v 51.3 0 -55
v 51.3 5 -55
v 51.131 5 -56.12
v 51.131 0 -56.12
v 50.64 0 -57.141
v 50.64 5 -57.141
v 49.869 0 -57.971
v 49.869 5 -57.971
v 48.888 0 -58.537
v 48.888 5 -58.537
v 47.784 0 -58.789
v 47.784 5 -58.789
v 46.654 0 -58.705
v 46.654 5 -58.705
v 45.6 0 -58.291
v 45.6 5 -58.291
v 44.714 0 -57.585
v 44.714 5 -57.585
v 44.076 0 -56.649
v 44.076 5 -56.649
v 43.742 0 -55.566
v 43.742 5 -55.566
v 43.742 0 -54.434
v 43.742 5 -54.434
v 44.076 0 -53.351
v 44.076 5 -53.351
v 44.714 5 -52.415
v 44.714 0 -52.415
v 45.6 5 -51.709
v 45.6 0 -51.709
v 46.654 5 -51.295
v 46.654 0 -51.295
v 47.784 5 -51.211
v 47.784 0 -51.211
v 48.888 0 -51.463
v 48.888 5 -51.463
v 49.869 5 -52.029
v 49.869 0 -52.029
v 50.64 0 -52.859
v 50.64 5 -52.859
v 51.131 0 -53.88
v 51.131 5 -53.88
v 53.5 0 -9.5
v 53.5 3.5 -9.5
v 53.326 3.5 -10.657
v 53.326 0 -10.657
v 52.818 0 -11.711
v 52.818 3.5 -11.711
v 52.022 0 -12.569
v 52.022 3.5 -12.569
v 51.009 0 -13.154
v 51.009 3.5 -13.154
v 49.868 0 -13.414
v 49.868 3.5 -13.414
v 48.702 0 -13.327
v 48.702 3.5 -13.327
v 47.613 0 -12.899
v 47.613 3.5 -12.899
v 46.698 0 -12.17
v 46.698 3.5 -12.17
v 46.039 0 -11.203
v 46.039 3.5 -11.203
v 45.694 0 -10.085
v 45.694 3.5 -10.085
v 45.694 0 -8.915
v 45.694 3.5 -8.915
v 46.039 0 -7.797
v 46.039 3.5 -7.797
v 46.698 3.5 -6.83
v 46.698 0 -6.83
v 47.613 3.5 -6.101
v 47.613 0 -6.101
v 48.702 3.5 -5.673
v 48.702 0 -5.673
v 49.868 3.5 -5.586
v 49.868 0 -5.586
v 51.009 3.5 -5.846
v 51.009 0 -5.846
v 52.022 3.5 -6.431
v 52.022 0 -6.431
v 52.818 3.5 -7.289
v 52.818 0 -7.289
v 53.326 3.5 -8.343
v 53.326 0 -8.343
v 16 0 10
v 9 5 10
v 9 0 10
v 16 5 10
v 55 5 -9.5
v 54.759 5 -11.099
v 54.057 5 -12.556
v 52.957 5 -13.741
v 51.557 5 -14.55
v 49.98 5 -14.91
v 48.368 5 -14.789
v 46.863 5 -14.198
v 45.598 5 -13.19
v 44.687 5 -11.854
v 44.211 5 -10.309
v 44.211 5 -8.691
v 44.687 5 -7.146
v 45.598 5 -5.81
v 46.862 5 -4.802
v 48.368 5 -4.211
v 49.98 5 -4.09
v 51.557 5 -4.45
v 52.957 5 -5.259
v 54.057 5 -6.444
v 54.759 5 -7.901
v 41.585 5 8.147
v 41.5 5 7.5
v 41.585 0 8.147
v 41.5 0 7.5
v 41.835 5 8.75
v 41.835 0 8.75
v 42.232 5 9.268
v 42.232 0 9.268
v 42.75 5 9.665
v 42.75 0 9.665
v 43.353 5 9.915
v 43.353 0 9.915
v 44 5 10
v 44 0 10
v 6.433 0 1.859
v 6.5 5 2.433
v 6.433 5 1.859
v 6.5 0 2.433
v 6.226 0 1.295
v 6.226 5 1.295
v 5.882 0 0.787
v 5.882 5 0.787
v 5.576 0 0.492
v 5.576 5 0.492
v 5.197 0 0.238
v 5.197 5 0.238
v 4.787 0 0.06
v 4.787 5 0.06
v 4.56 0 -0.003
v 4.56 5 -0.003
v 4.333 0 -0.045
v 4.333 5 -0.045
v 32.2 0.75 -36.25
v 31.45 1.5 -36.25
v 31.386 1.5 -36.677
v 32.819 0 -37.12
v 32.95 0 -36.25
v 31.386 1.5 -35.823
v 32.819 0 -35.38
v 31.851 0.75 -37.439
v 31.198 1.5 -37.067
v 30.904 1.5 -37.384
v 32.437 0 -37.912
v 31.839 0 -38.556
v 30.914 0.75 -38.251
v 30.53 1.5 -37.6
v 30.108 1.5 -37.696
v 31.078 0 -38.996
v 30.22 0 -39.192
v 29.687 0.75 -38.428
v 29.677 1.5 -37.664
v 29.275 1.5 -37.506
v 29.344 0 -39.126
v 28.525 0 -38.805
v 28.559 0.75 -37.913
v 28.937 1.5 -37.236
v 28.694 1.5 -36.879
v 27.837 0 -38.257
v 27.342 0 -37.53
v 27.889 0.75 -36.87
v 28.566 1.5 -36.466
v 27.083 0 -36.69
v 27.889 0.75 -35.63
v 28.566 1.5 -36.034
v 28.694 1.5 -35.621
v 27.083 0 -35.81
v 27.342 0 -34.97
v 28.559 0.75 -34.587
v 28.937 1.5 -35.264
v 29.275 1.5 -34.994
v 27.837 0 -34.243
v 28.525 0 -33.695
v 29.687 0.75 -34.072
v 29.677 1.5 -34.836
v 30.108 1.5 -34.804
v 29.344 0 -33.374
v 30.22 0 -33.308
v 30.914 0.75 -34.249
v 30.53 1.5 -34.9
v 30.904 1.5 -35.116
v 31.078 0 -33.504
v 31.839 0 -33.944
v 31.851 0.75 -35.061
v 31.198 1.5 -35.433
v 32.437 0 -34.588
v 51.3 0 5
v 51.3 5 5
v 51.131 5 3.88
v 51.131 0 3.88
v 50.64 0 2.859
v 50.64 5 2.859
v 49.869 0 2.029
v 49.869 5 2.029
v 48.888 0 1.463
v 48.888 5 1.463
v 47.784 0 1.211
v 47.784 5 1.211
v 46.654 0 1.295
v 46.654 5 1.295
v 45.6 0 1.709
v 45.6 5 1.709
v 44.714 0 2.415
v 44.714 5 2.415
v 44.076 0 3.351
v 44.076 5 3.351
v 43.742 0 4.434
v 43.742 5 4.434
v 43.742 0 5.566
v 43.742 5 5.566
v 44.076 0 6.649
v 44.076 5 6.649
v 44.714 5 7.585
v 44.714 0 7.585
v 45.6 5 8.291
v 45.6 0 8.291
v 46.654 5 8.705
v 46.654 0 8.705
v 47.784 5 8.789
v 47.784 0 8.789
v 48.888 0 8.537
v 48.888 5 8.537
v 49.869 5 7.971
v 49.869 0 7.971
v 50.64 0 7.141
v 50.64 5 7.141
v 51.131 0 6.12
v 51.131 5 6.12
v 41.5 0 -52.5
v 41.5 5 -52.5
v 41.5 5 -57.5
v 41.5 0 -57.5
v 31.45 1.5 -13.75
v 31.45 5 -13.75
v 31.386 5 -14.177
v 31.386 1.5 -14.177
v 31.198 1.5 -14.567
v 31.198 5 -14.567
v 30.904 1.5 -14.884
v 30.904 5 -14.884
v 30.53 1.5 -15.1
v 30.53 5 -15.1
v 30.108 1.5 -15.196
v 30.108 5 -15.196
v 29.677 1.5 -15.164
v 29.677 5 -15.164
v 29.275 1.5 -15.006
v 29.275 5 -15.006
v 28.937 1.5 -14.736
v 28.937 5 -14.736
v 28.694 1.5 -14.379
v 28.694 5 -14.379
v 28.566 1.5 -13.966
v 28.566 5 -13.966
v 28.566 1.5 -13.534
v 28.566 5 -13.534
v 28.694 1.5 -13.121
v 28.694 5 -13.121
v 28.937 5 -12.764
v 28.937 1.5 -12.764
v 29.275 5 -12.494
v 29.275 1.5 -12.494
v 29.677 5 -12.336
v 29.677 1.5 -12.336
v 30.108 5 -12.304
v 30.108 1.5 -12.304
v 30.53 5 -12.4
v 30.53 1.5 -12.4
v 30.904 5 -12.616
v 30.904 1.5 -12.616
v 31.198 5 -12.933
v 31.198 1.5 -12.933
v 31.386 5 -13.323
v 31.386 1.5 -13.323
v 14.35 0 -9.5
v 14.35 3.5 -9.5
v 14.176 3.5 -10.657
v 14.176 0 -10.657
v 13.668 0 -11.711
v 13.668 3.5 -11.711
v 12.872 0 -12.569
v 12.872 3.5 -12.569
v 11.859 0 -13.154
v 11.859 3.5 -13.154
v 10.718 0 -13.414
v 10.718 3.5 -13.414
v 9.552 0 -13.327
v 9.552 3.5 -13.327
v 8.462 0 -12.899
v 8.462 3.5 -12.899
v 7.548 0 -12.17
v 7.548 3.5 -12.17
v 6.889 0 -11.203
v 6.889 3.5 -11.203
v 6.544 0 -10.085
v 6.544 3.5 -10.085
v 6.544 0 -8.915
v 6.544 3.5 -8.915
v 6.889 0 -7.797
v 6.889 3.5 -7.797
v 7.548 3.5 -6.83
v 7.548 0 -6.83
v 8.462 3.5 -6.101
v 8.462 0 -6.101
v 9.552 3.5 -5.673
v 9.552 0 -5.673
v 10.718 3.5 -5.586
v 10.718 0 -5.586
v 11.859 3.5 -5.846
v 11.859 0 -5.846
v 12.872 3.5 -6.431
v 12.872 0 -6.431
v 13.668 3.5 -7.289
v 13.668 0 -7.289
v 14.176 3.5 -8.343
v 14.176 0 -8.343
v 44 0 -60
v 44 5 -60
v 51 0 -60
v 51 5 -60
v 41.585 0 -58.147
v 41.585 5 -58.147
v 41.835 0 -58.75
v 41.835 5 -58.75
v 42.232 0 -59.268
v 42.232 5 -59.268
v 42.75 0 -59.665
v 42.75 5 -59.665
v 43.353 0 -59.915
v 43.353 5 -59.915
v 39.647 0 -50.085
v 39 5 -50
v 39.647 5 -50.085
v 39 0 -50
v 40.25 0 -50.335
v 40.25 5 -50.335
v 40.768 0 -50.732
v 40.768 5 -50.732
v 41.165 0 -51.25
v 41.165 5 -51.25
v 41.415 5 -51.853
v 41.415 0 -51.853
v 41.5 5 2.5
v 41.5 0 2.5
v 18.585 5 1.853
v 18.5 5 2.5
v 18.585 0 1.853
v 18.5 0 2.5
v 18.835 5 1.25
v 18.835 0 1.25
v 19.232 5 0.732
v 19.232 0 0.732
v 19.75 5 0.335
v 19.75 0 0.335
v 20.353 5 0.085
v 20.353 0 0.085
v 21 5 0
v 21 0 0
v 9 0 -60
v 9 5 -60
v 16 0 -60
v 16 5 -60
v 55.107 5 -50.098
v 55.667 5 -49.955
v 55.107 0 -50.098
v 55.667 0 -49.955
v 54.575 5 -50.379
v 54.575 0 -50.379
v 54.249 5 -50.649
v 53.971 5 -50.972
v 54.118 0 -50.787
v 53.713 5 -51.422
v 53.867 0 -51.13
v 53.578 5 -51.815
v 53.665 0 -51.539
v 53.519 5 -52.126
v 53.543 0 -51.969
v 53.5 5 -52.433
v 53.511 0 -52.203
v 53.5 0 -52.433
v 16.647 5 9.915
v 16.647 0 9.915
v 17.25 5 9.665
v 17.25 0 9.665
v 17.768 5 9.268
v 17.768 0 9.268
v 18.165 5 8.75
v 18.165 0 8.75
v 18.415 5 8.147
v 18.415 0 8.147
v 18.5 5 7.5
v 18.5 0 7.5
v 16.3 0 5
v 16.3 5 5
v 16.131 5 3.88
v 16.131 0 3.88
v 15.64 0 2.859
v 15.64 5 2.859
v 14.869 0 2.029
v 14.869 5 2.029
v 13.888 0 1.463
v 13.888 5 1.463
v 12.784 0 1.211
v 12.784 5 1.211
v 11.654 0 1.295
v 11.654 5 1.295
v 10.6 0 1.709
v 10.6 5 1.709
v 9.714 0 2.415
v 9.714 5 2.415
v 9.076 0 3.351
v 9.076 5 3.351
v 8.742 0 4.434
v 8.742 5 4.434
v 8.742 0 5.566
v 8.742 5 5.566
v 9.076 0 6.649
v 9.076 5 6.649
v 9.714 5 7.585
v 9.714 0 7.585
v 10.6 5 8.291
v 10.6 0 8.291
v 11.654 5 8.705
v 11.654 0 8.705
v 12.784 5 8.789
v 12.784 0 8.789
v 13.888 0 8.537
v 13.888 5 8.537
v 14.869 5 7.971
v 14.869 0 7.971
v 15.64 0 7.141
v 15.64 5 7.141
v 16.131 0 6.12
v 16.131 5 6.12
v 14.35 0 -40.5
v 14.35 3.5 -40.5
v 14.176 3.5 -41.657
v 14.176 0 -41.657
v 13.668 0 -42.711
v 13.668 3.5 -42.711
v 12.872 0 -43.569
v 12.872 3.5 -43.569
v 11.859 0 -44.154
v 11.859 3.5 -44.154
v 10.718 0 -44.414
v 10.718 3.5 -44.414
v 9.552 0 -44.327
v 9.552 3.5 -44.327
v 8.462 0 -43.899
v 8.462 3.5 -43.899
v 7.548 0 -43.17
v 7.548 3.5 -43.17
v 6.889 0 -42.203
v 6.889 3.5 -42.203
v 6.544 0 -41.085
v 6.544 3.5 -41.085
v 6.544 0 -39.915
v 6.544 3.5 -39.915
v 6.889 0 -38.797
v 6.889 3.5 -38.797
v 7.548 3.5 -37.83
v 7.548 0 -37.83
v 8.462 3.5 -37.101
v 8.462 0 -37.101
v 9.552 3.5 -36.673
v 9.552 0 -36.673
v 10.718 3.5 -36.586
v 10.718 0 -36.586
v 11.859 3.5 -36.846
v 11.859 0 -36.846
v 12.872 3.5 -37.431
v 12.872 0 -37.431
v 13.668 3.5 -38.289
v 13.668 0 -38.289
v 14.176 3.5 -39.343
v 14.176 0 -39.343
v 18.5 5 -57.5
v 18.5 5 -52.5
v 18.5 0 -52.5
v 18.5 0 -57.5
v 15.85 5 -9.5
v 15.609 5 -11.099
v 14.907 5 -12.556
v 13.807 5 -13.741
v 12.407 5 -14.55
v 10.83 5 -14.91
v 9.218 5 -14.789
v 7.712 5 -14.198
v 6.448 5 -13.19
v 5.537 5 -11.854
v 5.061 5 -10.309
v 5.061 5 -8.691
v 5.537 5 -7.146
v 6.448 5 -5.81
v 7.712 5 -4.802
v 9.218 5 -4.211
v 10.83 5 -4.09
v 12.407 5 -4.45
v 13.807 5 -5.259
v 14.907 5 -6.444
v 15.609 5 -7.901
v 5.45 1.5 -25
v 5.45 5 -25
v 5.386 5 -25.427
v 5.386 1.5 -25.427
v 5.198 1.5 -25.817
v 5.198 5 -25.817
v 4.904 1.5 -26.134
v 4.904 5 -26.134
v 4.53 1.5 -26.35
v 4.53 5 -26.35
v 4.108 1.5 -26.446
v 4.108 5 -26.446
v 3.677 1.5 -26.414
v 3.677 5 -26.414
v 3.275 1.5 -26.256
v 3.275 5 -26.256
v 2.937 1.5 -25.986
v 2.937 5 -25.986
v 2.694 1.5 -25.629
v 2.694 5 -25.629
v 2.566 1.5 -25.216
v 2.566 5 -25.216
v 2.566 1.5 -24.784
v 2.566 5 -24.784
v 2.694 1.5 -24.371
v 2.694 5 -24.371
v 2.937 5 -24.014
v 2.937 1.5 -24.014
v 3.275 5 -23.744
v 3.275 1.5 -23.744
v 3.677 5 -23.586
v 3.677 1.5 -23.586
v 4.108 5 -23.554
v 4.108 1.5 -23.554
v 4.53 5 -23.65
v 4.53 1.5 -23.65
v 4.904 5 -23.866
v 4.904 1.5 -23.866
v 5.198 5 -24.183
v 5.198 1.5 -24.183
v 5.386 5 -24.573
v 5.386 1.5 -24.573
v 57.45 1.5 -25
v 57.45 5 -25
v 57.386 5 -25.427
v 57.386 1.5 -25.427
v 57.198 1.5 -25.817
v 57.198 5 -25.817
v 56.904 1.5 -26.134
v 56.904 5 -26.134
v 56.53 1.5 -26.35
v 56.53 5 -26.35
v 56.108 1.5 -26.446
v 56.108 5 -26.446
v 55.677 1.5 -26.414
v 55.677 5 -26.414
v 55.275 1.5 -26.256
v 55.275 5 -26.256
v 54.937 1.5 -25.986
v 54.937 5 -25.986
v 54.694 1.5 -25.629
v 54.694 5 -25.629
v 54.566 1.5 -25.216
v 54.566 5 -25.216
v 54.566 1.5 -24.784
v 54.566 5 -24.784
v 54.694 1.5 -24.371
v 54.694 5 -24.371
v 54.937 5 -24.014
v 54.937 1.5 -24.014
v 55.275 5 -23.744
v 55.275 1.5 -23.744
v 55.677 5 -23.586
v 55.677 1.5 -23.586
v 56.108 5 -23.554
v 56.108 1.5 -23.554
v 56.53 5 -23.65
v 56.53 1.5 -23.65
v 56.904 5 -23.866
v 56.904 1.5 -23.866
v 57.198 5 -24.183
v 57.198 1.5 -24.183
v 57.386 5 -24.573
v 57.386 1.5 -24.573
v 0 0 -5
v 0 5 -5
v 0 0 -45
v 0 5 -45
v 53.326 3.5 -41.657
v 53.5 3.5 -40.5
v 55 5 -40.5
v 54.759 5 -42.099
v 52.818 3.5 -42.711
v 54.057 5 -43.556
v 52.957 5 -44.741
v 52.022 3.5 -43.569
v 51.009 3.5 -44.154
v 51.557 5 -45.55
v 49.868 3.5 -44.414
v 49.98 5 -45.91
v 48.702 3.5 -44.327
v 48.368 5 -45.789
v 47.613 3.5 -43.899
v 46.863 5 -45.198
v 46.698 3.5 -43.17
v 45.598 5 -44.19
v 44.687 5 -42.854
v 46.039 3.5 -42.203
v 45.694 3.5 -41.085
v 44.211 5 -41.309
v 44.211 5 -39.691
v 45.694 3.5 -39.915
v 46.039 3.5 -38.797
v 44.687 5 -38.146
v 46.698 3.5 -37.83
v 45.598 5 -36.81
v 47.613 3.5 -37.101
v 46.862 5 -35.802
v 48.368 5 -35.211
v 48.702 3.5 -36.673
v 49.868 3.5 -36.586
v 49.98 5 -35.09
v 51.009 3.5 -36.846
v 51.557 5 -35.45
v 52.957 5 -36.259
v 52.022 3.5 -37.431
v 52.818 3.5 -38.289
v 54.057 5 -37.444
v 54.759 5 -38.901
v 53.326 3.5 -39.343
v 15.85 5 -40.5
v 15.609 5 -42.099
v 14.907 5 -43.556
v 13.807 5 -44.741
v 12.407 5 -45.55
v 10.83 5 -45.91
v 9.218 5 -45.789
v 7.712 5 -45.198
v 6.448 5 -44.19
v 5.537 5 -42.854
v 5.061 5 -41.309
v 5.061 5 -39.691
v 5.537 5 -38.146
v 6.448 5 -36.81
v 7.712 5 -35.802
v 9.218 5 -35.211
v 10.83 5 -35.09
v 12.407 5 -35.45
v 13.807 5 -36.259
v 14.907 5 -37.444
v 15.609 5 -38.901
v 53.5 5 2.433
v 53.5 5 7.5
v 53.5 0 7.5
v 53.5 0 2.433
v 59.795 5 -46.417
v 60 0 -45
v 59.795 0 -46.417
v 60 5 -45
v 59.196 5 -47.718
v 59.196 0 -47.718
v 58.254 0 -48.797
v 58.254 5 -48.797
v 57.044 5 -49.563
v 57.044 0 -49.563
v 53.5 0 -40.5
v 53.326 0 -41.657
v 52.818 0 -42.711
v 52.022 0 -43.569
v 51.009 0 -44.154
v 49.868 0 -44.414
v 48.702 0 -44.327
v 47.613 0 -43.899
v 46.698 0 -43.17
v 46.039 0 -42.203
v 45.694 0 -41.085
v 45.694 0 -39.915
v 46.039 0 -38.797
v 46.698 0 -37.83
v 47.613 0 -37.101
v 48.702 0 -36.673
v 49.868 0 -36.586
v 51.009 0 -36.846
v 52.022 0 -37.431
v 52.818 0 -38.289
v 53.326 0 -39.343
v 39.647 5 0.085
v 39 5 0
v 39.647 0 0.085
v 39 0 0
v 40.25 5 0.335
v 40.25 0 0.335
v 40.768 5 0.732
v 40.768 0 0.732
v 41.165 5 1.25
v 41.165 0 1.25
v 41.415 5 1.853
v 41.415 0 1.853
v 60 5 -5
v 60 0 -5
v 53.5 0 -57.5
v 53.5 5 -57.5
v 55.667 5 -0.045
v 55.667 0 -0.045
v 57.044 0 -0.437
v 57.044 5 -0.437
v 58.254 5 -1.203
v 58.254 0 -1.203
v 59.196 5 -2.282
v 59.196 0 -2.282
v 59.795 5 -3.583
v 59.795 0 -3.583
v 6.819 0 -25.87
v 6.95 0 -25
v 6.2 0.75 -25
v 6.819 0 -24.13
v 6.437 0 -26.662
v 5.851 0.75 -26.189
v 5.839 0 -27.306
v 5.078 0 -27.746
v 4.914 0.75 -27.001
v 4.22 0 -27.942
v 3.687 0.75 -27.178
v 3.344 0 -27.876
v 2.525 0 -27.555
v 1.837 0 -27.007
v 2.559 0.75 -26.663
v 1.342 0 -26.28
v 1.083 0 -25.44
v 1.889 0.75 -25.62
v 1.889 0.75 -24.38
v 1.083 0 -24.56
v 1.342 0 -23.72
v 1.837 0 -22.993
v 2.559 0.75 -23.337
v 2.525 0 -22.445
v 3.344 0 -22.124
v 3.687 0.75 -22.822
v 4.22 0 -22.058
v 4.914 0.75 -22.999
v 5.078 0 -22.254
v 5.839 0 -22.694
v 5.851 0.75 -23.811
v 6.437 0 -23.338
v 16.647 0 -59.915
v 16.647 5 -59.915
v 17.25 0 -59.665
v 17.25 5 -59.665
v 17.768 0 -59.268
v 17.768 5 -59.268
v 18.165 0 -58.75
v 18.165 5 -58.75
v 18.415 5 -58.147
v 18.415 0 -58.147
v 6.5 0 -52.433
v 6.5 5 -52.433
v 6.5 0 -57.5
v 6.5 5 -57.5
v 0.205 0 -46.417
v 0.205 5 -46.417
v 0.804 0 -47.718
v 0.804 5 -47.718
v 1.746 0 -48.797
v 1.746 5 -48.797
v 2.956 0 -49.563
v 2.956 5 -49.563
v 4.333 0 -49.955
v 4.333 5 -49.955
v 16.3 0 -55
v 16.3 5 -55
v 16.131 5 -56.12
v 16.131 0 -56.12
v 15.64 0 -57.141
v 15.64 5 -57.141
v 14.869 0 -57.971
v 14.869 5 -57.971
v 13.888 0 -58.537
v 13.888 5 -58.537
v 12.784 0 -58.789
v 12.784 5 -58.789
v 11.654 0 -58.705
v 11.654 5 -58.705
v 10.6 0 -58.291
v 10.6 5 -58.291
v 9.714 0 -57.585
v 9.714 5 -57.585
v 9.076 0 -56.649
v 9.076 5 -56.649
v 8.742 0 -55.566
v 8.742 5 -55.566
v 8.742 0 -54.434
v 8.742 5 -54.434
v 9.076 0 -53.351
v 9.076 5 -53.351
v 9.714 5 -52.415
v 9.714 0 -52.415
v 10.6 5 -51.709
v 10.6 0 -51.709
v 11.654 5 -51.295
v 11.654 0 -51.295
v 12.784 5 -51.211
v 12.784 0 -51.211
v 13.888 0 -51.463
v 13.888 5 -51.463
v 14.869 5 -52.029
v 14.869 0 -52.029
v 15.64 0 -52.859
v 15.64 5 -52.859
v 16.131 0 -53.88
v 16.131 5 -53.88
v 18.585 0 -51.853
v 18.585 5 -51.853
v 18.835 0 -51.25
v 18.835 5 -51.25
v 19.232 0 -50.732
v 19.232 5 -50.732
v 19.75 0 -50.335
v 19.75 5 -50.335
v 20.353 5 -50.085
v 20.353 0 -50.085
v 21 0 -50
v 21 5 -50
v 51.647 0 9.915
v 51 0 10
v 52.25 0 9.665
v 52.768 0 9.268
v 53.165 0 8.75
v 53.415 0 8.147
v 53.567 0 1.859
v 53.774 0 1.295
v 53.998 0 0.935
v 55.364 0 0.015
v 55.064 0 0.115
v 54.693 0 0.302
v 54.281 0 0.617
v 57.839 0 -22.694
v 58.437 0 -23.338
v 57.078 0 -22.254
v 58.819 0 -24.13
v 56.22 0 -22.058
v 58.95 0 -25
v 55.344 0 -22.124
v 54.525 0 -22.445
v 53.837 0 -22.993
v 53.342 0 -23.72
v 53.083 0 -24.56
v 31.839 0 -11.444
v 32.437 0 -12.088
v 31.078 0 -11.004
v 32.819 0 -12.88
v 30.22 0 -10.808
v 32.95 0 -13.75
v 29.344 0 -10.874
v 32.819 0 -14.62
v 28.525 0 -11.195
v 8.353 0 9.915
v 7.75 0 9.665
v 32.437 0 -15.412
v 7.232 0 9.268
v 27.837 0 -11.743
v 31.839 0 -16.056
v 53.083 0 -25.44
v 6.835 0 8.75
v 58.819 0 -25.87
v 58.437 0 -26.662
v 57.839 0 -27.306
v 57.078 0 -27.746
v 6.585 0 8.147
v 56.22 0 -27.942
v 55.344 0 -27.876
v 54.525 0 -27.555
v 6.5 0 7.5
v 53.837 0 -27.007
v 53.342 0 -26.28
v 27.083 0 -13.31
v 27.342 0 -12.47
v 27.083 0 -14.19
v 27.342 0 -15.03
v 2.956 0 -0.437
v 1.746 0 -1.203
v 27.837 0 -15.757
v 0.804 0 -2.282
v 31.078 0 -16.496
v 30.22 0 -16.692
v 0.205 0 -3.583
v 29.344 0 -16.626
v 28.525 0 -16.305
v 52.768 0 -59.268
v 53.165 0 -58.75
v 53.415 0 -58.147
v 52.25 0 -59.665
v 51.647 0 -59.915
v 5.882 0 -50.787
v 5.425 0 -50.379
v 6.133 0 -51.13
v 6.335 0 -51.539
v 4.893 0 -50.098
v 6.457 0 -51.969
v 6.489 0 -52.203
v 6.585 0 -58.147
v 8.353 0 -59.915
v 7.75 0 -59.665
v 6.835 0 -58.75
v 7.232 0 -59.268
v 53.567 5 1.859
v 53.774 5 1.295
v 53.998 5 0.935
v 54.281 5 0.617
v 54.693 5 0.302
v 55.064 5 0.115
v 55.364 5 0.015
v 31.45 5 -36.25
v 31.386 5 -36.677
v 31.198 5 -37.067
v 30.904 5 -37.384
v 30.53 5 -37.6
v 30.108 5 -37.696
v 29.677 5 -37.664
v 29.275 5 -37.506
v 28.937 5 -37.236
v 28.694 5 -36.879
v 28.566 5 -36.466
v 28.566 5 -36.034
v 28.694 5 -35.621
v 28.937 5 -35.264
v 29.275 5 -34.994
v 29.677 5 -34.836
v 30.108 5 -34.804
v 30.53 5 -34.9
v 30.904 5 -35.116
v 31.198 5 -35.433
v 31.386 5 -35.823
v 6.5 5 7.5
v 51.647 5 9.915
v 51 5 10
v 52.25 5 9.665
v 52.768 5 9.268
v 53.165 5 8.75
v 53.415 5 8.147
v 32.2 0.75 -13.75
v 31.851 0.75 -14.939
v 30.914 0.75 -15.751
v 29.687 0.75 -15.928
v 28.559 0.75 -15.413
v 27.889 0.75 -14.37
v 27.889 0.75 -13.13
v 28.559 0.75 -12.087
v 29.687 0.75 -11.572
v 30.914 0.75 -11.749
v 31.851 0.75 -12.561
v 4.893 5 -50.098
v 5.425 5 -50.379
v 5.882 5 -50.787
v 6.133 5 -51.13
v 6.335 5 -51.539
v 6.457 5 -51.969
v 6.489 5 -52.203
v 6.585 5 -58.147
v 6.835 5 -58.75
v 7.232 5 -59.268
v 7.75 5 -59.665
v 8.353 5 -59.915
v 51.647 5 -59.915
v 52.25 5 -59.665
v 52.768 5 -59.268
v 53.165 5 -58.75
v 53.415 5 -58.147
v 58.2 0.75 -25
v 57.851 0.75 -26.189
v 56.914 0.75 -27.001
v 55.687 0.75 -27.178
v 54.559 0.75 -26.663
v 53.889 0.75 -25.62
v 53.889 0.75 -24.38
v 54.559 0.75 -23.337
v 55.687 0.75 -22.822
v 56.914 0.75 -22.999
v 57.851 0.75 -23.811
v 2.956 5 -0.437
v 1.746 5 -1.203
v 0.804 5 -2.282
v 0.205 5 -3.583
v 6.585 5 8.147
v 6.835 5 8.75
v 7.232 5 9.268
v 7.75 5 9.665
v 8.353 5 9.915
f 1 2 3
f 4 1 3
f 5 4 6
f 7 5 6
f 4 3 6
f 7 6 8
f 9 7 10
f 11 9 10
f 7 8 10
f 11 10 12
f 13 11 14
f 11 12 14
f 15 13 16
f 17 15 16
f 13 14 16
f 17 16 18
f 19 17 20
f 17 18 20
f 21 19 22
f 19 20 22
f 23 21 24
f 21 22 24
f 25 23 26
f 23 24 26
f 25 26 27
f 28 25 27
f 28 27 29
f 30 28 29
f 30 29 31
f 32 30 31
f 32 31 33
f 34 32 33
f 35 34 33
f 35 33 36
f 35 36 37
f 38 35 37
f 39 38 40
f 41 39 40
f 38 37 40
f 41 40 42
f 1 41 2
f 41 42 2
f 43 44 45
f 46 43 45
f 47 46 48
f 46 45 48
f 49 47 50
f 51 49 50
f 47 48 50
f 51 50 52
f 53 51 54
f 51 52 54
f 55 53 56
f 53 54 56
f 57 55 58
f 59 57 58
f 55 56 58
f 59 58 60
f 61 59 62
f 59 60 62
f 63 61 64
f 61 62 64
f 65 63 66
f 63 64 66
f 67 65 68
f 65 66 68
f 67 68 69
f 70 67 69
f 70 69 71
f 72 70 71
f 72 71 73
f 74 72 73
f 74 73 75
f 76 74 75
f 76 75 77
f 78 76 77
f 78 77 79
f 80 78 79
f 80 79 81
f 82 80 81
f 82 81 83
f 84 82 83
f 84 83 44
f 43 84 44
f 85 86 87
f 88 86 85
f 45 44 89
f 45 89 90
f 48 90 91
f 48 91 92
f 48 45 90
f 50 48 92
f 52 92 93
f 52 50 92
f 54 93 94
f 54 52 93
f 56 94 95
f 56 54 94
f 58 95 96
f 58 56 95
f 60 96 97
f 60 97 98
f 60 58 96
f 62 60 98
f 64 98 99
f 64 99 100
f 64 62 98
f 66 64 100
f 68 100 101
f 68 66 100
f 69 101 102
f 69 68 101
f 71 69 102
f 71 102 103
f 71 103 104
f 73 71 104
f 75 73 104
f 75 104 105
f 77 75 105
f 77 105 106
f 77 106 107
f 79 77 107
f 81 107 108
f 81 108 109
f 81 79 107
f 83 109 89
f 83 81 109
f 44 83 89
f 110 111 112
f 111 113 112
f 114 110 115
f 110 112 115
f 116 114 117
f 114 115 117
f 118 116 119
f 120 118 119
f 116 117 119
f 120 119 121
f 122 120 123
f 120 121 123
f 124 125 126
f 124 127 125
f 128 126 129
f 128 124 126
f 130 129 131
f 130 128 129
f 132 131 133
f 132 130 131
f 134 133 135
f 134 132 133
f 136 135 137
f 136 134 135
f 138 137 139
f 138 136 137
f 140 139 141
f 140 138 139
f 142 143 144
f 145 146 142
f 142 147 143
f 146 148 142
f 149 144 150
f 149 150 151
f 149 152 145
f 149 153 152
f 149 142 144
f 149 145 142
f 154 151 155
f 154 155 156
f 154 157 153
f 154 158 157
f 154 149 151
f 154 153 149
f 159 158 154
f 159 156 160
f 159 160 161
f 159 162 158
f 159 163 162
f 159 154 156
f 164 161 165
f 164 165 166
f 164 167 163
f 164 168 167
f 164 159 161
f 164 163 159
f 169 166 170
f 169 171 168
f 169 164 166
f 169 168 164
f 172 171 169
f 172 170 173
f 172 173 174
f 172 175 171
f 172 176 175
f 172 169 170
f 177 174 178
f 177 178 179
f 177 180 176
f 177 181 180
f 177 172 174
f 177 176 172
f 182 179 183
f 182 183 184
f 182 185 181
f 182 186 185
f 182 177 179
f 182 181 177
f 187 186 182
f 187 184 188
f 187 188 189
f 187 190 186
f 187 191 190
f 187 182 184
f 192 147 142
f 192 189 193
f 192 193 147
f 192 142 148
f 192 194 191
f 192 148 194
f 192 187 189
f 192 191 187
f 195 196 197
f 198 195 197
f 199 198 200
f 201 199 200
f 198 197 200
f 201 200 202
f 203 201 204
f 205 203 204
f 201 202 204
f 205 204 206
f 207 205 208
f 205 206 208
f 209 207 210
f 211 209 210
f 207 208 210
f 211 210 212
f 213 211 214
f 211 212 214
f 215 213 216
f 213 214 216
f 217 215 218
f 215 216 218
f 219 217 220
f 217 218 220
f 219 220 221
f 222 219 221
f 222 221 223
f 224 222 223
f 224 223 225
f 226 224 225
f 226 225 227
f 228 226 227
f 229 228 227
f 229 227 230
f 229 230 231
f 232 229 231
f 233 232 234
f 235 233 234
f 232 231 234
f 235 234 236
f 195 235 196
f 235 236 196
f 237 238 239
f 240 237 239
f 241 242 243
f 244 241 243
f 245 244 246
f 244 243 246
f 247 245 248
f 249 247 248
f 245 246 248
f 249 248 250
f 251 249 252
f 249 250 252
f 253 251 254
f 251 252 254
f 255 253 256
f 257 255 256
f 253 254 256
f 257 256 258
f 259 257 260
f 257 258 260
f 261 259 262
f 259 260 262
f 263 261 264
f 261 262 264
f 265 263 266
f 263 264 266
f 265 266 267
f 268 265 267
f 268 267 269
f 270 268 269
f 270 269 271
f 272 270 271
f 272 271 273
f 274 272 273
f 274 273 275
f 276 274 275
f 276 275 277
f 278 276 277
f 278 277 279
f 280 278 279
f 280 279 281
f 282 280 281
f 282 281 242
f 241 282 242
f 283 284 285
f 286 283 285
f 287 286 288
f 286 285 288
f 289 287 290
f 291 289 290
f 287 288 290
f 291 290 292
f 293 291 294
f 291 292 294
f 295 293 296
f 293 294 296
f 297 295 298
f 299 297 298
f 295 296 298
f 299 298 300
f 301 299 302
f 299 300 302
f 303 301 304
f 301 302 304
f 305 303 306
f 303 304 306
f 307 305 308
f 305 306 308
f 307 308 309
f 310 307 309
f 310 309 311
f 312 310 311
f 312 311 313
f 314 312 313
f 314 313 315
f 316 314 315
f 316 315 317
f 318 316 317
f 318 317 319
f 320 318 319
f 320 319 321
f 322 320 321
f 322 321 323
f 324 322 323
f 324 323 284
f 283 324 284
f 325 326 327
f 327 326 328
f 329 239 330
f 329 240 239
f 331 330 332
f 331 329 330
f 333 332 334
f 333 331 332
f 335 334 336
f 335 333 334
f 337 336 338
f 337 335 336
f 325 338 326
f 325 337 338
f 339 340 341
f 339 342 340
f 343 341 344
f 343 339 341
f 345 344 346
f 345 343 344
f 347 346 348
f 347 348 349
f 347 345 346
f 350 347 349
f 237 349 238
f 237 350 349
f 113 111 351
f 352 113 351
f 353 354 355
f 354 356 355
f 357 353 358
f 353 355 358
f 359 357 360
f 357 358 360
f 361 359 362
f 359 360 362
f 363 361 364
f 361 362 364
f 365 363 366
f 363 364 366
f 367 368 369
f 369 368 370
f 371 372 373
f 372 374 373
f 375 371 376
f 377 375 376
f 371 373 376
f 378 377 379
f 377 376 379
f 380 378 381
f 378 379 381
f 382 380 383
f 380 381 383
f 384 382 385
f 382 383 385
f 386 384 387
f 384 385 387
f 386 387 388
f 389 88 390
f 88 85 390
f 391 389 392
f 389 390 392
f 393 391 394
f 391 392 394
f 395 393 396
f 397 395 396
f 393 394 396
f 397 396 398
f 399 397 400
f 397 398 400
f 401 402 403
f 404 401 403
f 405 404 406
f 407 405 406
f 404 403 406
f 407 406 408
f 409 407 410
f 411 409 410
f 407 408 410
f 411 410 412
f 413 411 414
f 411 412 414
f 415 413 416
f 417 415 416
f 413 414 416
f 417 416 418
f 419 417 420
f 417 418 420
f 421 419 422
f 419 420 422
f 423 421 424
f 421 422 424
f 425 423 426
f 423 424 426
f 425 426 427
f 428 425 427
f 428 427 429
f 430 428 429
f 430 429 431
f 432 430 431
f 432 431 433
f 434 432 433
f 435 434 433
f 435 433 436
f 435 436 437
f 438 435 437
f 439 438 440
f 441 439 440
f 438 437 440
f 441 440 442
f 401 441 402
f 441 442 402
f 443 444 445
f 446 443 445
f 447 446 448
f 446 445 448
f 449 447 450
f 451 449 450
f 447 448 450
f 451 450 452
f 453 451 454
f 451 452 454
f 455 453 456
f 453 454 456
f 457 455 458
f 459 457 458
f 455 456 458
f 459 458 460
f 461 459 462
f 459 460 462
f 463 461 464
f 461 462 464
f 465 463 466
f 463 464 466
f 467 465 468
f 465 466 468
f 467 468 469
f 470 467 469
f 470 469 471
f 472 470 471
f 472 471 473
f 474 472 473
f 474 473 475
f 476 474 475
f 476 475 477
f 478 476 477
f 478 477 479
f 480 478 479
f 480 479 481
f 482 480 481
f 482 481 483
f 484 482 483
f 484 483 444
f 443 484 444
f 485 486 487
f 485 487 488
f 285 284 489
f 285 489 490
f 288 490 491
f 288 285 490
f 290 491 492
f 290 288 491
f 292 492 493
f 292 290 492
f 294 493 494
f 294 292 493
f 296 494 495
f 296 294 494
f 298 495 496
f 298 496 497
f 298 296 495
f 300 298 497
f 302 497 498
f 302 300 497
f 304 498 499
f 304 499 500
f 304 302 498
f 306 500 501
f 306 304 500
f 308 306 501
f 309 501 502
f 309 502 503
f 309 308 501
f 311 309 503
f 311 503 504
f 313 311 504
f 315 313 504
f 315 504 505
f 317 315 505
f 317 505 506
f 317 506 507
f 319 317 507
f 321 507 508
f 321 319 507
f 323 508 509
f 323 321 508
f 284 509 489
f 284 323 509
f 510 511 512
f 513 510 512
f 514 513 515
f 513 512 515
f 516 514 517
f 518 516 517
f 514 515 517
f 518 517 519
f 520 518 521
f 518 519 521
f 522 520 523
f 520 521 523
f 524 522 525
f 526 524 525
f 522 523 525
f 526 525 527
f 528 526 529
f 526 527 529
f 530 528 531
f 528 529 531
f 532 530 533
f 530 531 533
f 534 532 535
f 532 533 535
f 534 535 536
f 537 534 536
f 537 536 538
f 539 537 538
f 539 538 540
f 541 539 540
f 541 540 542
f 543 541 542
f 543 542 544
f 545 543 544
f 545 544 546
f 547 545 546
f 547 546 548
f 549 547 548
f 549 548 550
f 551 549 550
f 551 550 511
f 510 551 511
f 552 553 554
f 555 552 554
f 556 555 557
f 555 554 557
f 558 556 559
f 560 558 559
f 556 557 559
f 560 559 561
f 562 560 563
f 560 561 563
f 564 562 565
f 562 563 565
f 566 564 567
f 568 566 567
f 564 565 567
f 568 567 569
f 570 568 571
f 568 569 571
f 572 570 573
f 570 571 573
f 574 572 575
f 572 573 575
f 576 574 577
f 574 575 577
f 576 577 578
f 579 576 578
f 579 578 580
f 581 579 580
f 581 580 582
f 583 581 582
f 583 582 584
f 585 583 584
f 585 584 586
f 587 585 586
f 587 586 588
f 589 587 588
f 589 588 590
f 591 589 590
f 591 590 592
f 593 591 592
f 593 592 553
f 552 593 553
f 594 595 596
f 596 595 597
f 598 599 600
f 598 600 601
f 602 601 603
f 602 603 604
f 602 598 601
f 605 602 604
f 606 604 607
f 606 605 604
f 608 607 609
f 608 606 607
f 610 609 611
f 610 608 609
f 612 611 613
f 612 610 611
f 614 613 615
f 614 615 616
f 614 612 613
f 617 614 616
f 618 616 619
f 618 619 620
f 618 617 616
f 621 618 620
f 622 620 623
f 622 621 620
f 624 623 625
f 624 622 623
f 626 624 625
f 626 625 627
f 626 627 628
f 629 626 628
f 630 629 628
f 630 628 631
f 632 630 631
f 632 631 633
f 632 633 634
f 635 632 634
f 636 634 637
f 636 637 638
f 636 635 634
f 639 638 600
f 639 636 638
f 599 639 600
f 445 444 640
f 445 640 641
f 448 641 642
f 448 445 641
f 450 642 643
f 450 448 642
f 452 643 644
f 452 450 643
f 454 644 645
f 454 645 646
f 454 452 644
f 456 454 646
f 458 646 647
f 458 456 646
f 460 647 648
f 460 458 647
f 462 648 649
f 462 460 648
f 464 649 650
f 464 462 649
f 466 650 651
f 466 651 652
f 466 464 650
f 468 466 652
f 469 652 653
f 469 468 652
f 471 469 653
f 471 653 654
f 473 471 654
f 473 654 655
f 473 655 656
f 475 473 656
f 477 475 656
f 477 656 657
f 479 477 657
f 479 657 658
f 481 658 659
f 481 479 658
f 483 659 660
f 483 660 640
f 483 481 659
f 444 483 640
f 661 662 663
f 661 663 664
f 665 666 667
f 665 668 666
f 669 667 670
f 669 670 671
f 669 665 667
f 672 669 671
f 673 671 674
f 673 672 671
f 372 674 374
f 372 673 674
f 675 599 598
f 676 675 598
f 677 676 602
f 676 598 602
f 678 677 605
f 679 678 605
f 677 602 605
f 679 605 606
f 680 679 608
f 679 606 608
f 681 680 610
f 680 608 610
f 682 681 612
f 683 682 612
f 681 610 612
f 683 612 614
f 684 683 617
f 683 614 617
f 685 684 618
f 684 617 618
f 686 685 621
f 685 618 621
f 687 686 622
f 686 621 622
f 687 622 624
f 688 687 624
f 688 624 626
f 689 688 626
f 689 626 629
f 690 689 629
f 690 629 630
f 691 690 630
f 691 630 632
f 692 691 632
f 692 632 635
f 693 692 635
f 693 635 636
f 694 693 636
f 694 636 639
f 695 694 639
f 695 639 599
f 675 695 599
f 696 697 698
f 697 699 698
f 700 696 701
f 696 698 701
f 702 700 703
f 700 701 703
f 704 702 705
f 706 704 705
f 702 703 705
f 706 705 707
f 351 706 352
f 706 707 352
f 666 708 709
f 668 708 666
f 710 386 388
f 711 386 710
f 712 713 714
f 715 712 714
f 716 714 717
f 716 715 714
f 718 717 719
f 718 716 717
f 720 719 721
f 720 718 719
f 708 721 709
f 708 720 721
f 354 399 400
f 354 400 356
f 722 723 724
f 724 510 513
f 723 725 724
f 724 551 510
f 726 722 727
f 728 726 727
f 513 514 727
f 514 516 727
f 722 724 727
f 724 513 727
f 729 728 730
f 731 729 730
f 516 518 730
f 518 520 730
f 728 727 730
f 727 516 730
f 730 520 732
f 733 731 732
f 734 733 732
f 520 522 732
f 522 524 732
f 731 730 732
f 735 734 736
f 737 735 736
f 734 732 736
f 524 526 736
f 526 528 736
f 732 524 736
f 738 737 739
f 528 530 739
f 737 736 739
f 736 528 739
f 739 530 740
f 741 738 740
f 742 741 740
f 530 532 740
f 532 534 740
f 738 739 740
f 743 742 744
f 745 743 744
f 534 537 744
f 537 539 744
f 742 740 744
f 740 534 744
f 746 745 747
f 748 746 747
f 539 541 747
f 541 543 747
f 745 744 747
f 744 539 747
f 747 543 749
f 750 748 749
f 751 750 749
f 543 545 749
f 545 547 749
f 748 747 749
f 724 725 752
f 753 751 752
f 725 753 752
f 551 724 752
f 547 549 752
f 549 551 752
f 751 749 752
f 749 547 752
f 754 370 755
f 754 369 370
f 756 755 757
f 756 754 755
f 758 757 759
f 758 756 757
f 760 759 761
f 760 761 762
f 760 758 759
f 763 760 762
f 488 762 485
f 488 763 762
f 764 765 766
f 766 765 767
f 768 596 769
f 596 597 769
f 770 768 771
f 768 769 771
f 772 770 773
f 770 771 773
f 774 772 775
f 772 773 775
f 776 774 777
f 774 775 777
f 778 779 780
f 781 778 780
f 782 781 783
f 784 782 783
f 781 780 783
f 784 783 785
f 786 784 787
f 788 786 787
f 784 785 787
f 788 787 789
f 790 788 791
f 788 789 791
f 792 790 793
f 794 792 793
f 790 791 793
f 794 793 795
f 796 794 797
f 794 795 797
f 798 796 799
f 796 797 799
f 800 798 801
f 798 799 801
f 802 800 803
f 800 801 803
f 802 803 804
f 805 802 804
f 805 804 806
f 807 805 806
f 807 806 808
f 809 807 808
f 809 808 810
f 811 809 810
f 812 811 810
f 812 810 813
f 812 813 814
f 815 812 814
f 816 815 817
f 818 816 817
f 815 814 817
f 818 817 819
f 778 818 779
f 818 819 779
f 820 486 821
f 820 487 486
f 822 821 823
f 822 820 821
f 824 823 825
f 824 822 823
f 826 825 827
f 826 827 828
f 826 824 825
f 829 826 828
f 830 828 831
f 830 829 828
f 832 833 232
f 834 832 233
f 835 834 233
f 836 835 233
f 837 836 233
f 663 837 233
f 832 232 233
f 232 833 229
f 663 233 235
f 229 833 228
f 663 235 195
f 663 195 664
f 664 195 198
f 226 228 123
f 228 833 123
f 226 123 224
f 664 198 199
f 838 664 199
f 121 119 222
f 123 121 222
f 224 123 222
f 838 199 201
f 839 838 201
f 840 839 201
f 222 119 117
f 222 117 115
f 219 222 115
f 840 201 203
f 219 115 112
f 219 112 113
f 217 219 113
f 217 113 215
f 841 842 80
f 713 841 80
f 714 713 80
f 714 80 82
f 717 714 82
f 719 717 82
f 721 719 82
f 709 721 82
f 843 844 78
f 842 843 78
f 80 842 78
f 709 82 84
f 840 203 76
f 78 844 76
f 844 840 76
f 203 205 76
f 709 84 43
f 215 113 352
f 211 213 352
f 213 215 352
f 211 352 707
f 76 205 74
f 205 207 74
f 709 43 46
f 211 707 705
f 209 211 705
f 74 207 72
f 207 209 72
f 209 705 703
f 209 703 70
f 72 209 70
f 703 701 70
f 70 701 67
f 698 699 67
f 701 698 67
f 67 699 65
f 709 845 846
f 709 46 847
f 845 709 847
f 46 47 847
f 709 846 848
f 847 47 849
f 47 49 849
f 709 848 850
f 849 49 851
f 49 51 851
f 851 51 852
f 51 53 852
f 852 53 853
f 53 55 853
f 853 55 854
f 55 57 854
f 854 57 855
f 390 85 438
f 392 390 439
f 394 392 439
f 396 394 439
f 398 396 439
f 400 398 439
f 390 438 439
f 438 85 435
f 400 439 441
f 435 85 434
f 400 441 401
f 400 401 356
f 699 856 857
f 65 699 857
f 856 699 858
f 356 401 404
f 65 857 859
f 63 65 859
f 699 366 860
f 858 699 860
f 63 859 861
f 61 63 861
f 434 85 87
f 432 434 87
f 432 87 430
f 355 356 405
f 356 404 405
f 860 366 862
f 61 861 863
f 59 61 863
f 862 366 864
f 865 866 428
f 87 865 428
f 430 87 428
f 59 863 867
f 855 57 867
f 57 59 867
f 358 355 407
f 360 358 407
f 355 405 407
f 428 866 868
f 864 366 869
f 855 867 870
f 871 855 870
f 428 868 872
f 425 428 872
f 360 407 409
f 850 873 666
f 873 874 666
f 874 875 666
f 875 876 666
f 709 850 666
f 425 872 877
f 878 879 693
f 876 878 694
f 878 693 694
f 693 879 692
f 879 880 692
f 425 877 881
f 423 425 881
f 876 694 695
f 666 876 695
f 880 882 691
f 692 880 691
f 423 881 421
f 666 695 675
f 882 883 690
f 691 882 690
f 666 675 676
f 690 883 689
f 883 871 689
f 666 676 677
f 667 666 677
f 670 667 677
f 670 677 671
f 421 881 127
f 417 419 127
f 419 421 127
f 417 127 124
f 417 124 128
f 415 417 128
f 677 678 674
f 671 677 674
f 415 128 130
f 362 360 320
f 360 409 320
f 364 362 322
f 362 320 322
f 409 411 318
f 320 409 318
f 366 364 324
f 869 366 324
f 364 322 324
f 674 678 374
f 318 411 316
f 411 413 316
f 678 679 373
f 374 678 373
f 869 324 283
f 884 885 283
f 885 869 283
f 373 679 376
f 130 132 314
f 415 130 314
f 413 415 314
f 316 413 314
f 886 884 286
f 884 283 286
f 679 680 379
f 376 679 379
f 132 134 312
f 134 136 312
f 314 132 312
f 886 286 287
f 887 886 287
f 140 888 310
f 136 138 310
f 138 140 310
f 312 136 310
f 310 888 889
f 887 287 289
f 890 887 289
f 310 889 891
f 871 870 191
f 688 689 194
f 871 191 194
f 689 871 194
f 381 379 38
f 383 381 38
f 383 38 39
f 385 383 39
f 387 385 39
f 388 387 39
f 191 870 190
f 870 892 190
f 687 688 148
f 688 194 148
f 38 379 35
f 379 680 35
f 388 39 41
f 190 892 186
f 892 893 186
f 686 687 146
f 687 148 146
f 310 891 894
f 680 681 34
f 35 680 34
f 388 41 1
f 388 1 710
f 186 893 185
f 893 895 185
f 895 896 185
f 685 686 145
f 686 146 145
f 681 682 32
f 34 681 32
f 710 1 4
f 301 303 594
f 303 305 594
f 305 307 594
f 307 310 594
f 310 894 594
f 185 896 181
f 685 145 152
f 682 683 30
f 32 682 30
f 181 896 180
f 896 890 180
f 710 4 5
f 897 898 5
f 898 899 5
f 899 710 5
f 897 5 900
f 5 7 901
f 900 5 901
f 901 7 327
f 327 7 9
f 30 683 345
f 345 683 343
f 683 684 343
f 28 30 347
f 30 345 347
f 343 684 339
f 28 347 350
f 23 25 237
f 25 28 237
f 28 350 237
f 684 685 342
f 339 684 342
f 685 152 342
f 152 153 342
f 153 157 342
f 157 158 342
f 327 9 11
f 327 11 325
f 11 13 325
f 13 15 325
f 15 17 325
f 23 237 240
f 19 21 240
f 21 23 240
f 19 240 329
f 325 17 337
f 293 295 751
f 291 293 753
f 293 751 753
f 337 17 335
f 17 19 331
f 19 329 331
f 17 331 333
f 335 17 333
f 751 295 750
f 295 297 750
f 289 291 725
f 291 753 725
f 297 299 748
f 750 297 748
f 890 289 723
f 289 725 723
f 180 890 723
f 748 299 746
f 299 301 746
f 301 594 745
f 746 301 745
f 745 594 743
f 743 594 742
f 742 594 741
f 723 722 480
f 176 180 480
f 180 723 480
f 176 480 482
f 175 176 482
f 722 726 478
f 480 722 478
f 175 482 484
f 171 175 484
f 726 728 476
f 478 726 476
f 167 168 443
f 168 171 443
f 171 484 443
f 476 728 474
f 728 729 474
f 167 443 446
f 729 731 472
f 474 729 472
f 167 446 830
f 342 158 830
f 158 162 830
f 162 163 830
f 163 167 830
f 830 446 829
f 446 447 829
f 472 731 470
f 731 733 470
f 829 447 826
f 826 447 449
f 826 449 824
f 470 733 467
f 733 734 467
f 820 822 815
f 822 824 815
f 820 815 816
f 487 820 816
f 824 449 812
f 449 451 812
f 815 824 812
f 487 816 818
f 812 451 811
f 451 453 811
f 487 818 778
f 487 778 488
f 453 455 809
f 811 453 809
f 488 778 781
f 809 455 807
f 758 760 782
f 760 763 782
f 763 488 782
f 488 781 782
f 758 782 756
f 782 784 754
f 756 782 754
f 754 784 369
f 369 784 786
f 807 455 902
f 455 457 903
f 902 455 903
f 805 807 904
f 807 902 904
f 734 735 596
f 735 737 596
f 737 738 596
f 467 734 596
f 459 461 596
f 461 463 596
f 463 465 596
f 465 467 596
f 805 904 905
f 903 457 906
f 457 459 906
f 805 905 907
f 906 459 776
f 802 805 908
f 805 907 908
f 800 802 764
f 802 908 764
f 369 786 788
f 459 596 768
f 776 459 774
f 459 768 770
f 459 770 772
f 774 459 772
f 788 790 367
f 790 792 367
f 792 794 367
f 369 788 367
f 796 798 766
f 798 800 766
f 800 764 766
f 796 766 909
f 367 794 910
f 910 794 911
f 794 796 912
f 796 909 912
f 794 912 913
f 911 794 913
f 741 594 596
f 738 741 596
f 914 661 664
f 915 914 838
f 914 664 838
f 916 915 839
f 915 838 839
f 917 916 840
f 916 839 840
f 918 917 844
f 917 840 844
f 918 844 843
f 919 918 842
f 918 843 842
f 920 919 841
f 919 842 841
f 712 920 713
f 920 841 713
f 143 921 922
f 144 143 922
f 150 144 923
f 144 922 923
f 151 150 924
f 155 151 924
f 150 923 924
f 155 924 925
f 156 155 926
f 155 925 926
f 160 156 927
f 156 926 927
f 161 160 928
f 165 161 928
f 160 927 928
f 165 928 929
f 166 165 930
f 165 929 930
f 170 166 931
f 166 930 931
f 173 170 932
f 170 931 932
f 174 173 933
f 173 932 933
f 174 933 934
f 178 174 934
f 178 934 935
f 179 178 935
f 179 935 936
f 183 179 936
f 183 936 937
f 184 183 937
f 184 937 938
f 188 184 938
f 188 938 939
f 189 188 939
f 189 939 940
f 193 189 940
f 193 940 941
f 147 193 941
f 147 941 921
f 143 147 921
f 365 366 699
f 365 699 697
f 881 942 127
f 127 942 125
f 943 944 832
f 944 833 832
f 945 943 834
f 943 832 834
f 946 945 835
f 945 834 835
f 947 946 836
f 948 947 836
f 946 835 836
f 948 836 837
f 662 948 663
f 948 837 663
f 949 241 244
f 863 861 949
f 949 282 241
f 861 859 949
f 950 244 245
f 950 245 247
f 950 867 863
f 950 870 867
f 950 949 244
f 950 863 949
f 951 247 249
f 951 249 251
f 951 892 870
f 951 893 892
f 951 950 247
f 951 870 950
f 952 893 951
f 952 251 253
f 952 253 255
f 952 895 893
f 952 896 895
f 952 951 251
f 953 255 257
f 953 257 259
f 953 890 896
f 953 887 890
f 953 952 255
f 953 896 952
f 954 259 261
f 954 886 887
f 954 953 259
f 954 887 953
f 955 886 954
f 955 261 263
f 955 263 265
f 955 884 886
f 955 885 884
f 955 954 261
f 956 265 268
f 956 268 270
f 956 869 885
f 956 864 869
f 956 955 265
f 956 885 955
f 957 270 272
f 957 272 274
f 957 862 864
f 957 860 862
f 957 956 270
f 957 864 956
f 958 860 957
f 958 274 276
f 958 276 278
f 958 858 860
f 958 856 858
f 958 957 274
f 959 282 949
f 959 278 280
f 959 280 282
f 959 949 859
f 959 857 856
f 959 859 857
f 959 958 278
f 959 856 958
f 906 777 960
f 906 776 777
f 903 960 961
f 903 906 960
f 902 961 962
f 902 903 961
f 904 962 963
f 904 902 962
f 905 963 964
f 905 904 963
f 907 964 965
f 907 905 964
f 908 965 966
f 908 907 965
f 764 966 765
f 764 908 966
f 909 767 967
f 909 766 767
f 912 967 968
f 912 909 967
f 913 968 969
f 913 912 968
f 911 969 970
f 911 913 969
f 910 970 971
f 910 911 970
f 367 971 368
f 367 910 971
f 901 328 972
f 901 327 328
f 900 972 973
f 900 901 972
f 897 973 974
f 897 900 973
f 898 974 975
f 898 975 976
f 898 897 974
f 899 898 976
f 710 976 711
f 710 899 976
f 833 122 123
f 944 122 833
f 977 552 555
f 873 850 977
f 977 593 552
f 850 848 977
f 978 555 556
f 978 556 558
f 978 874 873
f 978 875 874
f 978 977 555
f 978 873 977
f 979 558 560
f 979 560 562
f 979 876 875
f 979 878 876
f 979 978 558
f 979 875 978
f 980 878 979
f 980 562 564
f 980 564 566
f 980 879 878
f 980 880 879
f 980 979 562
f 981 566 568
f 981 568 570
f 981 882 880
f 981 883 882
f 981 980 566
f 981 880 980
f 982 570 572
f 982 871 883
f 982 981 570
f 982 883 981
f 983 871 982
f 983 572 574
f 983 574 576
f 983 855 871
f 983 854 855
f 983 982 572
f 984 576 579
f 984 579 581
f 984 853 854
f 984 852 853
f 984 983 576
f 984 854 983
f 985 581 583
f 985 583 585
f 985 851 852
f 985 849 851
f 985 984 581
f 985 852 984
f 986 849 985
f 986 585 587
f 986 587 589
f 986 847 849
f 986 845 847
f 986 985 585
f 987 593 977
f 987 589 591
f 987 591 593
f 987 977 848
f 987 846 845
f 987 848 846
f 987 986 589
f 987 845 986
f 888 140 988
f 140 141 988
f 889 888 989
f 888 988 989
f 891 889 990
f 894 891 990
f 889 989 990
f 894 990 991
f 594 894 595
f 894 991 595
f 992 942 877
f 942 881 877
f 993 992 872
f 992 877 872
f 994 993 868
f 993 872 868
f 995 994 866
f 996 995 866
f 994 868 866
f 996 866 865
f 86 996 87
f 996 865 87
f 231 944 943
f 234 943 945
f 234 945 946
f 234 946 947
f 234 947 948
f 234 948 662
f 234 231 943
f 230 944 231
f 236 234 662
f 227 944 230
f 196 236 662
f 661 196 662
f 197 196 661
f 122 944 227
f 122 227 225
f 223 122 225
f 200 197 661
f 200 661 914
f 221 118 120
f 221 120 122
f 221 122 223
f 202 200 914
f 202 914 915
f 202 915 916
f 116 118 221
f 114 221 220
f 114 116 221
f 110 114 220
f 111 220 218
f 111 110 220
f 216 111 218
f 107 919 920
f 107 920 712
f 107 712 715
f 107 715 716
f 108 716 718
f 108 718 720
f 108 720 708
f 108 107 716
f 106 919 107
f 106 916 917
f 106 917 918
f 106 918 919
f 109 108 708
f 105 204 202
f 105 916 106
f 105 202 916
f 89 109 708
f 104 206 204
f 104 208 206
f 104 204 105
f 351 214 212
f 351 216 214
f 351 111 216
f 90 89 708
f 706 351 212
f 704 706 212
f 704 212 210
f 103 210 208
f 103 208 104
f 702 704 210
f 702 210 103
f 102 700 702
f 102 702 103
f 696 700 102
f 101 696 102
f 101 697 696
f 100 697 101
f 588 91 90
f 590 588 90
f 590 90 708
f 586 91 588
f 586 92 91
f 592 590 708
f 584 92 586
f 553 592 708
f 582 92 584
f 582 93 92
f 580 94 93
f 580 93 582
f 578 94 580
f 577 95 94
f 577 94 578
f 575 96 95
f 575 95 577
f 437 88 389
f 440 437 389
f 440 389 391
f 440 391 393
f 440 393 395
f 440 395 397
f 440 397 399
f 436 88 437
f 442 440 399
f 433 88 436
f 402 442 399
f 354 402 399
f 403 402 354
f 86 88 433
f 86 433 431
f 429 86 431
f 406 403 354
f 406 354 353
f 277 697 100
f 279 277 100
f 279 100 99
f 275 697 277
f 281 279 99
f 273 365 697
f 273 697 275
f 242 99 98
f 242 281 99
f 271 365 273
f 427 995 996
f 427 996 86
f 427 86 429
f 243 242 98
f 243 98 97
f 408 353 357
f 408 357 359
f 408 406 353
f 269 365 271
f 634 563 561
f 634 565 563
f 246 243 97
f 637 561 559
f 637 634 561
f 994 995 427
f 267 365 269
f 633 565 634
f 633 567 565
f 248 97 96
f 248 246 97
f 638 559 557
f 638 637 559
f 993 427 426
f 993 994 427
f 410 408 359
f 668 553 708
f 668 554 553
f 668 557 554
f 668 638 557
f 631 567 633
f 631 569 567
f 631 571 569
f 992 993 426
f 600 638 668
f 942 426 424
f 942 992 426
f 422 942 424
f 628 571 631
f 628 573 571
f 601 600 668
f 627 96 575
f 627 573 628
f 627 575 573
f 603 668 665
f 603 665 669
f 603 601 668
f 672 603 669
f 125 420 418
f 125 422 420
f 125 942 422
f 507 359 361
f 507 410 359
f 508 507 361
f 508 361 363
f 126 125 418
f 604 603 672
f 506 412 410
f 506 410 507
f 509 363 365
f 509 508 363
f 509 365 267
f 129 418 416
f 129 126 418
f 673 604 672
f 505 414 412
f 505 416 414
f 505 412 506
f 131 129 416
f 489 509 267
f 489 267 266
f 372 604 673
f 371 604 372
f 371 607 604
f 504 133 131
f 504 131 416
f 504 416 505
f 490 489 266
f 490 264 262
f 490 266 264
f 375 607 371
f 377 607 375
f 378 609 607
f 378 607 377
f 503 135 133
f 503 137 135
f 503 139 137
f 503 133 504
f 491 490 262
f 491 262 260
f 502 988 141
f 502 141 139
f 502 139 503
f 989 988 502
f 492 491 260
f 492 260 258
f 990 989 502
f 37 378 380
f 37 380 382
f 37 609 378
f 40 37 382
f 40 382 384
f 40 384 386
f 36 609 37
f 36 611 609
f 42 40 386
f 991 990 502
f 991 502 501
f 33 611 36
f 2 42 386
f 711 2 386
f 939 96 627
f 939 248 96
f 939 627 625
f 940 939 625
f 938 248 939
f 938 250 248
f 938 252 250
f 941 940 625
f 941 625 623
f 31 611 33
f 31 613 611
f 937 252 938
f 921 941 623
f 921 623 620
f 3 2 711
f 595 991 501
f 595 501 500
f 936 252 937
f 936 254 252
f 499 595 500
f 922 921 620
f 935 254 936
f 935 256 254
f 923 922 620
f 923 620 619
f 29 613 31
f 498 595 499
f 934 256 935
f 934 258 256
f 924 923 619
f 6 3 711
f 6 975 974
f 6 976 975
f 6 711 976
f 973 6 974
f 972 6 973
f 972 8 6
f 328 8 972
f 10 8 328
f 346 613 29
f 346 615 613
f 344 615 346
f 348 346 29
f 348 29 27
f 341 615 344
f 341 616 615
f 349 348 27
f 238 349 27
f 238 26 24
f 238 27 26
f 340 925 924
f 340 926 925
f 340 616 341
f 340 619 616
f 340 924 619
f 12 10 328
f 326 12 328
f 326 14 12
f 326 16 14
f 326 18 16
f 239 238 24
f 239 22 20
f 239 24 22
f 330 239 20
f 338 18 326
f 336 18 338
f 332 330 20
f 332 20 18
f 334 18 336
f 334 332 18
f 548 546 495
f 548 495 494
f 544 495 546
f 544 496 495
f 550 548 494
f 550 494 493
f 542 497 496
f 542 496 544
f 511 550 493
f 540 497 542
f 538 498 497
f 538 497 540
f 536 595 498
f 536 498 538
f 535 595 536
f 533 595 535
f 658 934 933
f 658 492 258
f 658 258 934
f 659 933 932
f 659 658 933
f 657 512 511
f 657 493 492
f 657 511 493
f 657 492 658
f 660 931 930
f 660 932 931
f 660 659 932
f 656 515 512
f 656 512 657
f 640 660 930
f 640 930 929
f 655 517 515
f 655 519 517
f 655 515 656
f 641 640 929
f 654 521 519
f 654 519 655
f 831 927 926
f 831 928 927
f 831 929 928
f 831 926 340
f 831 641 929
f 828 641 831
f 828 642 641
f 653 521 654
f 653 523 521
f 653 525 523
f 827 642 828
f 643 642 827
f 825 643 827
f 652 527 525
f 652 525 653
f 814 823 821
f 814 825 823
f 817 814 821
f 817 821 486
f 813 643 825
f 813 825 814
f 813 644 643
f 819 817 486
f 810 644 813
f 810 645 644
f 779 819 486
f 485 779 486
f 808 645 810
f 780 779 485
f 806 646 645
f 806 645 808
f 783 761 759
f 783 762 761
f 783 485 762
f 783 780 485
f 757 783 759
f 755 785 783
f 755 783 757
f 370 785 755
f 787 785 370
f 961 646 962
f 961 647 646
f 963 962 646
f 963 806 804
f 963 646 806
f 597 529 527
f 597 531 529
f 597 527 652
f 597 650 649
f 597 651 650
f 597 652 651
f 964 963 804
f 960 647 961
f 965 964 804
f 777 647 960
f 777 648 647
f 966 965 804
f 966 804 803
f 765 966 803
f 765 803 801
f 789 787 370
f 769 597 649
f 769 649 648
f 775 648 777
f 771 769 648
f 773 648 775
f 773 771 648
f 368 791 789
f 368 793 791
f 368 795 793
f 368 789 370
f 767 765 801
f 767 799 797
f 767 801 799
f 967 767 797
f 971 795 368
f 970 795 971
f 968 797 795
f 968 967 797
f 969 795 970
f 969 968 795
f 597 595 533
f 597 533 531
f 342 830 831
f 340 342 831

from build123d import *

# Parameters (mm, degrees)
SKETCH1_W           = 50
SKETCH1_H           = 5
BOSS_EXTRUDE1_DEPTH = 60
SKETCH2_R           = 3.925
SKETCH2_R_2         = 1.45
CUT_EXTRUDE1_DEPTH  = 79.262379212
CHAMFER1_SIZE       = 1.5
FILLET2_R           = 5
SKETCH2_3_W         = 12
SKETCH2_3_H         = 10
SKETCH2_3_R         = 3.8
BOSS_EXTRUDE2_DEPTH = 5
FILLET5_R           = 2.5
FILLET6_R           = 2.5
CHAMFER2_SIZE       = 1.5
CHAMFER3_SIZE       = 1.5


with BuildPart() as part:
    # Sketch1 → Boss-Extrude1 (new body)
    with BuildSketch(Plane(origin=(0, 0, 0), x_dir=(0, 0, -1), z_dir=(1, 0, 0))):
        with Locations((25, 2.5)):
            Rectangle(SKETCH1_W, SKETCH1_H)
    extrude(amount=BOSS_EXTRUDE1_DEPTH)

    # Sketch2 → Cut-Extrude1 (cut, through all)
    with BuildSketch(Plane(origin=(0, 5, 0), x_dir=(1, 0, 0), z_dir=(0, 1, 0))):
        with Locations((49.575, 40.5)):
            Circle(SKETCH2_R)
        with Locations((10.425, 40.5)):
            Circle(SKETCH2_R)
        with Locations((10.425, 9.5)):
            Circle(SKETCH2_R)
        with Locations((49.575, 9.5)):
            Circle(SKETCH2_R)
        with Locations((30, 36.25)):
            Circle(SKETCH2_R_2)
        with Locations((30, 13.75)):
            Circle(SKETCH2_R_2)
        with Locations((56, 25)):
            Circle(SKETCH2_R_2)
        with Locations((4, 25)):
            Circle(SKETCH2_R_2)
    extrude(amount=-CUT_EXTRUDE1_DEPTH, mode=Mode.SUBTRACT)

    # Chamfer1
    chamfer1_edges = [part.edges().sort_by_distance(p)[0] for p in [
        (6.5, 5, -9.5),
        (45.65, 5, -9.5),
        (6.5, 5, -40.5),
        (45.65, 5, -40.5),
    ]]
    chamfer(chamfer1_edges, length=CHAMFER1_SIZE)

    # Fillet2
    fillet2_edges = [part.edges().sort_by_distance(p)[0] for p in [
        (0, 2.5, -50),
        (0, 2.5, 0),
        (60, 2.5, 0),
        (60, 2.5, -50),
    ]]
    fillet(fillet2_edges, radius=FILLET2_R)

    # Sketch2<3> → Boss-Extrude2 (add)
    # profile 1 of 4: a face of its own
    with BuildSketch(Plane(origin=(0, 5, 0), x_dir=(1, 0, 0), z_dir=(0, 1, 0))):
        with Locations((47.5, 55)):
            Rectangle(SKETCH2_3_W, SKETCH2_3_H)
        with Locations((47.5, 55)):
            Circle(SKETCH2_3_R, mode=Mode.SUBTRACT)
    # profile 2 of 4: a face of its own
    with BuildSketch(Plane(origin=(0, 5, 0), x_dir=(1, 0, 0), z_dir=(0, 1, 0))):
        with Locations((12.5, 55)):
            Rectangle(SKETCH2_3_W, SKETCH2_3_H)
        with Locations((12.5, 55)):
            Circle(SKETCH2_3_R, mode=Mode.SUBTRACT)
    # profile 3 of 4: a face of its own
    with BuildSketch(Plane(origin=(0, 5, 0), x_dir=(1, 0, 0), z_dir=(0, 1, 0))):
        with Locations((47.5, -5)):
            Rectangle(SKETCH2_3_W, SKETCH2_3_H)
        with Locations((47.5, -5)):
            Circle(SKETCH2_3_R, mode=Mode.SUBTRACT)
    # profile 4 of 4: a face of its own
    with BuildSketch(Plane(origin=(0, 5, 0), x_dir=(1, 0, 0), z_dir=(0, 1, 0))):
        with Locations((12.5, -5)):
            Rectangle(SKETCH2_3_W, SKETCH2_3_H)
        with Locations((12.5, -5)):
            Circle(SKETCH2_3_R, mode=Mode.SUBTRACT)
    extrude(amount=-BOSS_EXTRUDE2_DEPTH)

    # Fillet5
    fillet5_edges = [part.edges().sort_by_distance(p)[0] for p in [
        (41.5, 2.5, 10),
        (53.5, 2.5, 10),
        (6.5, 2.5, 10),
        (18.5, 2.5, 10),
        (53.5, 2.5, -60),
        (41.5, 2.5, -60),
        (6.5, 2.5, -60),
        (18.5, 2.5, -60),
    ]]
    fillet(fillet5_edges, radius=FILLET5_R)

    # Fillet6
    fillet6_edges = [part.edges().sort_by_distance(p)[0] for p in [
        (18.5, 2.5, 0),
        (53.5, 2.5, 0),
        (6.5, 2.5, 0),
        (41.5, 2.5, 0),
        (6.5, 2.5, -50),
        (41.5, 2.5, -50),
        (53.5, 2.5, -50),
        (18.5, 2.5, -50),
    ]]
    fillet(fillet6_edges, radius=FILLET6_R)

    # Chamfer2
    chamfer2_edges = [part.edges().sort_by_distance(p)[0] for p in [
        (28.55, 0, -13.75),
        (54.55, 0, -25),
        (28.55, 0, -36.25),
    ]]
    chamfer(chamfer2_edges, length=CHAMFER2_SIZE)

    # Chamfer3
    chamfer3_edges = [part.edges().sort_by_distance(p)[0] for p in [
        (2.55, 0, -25),
    ]]
    chamfer(chamfer3_edges, length=CHAMFER3_SIZE)


solid = part.part
